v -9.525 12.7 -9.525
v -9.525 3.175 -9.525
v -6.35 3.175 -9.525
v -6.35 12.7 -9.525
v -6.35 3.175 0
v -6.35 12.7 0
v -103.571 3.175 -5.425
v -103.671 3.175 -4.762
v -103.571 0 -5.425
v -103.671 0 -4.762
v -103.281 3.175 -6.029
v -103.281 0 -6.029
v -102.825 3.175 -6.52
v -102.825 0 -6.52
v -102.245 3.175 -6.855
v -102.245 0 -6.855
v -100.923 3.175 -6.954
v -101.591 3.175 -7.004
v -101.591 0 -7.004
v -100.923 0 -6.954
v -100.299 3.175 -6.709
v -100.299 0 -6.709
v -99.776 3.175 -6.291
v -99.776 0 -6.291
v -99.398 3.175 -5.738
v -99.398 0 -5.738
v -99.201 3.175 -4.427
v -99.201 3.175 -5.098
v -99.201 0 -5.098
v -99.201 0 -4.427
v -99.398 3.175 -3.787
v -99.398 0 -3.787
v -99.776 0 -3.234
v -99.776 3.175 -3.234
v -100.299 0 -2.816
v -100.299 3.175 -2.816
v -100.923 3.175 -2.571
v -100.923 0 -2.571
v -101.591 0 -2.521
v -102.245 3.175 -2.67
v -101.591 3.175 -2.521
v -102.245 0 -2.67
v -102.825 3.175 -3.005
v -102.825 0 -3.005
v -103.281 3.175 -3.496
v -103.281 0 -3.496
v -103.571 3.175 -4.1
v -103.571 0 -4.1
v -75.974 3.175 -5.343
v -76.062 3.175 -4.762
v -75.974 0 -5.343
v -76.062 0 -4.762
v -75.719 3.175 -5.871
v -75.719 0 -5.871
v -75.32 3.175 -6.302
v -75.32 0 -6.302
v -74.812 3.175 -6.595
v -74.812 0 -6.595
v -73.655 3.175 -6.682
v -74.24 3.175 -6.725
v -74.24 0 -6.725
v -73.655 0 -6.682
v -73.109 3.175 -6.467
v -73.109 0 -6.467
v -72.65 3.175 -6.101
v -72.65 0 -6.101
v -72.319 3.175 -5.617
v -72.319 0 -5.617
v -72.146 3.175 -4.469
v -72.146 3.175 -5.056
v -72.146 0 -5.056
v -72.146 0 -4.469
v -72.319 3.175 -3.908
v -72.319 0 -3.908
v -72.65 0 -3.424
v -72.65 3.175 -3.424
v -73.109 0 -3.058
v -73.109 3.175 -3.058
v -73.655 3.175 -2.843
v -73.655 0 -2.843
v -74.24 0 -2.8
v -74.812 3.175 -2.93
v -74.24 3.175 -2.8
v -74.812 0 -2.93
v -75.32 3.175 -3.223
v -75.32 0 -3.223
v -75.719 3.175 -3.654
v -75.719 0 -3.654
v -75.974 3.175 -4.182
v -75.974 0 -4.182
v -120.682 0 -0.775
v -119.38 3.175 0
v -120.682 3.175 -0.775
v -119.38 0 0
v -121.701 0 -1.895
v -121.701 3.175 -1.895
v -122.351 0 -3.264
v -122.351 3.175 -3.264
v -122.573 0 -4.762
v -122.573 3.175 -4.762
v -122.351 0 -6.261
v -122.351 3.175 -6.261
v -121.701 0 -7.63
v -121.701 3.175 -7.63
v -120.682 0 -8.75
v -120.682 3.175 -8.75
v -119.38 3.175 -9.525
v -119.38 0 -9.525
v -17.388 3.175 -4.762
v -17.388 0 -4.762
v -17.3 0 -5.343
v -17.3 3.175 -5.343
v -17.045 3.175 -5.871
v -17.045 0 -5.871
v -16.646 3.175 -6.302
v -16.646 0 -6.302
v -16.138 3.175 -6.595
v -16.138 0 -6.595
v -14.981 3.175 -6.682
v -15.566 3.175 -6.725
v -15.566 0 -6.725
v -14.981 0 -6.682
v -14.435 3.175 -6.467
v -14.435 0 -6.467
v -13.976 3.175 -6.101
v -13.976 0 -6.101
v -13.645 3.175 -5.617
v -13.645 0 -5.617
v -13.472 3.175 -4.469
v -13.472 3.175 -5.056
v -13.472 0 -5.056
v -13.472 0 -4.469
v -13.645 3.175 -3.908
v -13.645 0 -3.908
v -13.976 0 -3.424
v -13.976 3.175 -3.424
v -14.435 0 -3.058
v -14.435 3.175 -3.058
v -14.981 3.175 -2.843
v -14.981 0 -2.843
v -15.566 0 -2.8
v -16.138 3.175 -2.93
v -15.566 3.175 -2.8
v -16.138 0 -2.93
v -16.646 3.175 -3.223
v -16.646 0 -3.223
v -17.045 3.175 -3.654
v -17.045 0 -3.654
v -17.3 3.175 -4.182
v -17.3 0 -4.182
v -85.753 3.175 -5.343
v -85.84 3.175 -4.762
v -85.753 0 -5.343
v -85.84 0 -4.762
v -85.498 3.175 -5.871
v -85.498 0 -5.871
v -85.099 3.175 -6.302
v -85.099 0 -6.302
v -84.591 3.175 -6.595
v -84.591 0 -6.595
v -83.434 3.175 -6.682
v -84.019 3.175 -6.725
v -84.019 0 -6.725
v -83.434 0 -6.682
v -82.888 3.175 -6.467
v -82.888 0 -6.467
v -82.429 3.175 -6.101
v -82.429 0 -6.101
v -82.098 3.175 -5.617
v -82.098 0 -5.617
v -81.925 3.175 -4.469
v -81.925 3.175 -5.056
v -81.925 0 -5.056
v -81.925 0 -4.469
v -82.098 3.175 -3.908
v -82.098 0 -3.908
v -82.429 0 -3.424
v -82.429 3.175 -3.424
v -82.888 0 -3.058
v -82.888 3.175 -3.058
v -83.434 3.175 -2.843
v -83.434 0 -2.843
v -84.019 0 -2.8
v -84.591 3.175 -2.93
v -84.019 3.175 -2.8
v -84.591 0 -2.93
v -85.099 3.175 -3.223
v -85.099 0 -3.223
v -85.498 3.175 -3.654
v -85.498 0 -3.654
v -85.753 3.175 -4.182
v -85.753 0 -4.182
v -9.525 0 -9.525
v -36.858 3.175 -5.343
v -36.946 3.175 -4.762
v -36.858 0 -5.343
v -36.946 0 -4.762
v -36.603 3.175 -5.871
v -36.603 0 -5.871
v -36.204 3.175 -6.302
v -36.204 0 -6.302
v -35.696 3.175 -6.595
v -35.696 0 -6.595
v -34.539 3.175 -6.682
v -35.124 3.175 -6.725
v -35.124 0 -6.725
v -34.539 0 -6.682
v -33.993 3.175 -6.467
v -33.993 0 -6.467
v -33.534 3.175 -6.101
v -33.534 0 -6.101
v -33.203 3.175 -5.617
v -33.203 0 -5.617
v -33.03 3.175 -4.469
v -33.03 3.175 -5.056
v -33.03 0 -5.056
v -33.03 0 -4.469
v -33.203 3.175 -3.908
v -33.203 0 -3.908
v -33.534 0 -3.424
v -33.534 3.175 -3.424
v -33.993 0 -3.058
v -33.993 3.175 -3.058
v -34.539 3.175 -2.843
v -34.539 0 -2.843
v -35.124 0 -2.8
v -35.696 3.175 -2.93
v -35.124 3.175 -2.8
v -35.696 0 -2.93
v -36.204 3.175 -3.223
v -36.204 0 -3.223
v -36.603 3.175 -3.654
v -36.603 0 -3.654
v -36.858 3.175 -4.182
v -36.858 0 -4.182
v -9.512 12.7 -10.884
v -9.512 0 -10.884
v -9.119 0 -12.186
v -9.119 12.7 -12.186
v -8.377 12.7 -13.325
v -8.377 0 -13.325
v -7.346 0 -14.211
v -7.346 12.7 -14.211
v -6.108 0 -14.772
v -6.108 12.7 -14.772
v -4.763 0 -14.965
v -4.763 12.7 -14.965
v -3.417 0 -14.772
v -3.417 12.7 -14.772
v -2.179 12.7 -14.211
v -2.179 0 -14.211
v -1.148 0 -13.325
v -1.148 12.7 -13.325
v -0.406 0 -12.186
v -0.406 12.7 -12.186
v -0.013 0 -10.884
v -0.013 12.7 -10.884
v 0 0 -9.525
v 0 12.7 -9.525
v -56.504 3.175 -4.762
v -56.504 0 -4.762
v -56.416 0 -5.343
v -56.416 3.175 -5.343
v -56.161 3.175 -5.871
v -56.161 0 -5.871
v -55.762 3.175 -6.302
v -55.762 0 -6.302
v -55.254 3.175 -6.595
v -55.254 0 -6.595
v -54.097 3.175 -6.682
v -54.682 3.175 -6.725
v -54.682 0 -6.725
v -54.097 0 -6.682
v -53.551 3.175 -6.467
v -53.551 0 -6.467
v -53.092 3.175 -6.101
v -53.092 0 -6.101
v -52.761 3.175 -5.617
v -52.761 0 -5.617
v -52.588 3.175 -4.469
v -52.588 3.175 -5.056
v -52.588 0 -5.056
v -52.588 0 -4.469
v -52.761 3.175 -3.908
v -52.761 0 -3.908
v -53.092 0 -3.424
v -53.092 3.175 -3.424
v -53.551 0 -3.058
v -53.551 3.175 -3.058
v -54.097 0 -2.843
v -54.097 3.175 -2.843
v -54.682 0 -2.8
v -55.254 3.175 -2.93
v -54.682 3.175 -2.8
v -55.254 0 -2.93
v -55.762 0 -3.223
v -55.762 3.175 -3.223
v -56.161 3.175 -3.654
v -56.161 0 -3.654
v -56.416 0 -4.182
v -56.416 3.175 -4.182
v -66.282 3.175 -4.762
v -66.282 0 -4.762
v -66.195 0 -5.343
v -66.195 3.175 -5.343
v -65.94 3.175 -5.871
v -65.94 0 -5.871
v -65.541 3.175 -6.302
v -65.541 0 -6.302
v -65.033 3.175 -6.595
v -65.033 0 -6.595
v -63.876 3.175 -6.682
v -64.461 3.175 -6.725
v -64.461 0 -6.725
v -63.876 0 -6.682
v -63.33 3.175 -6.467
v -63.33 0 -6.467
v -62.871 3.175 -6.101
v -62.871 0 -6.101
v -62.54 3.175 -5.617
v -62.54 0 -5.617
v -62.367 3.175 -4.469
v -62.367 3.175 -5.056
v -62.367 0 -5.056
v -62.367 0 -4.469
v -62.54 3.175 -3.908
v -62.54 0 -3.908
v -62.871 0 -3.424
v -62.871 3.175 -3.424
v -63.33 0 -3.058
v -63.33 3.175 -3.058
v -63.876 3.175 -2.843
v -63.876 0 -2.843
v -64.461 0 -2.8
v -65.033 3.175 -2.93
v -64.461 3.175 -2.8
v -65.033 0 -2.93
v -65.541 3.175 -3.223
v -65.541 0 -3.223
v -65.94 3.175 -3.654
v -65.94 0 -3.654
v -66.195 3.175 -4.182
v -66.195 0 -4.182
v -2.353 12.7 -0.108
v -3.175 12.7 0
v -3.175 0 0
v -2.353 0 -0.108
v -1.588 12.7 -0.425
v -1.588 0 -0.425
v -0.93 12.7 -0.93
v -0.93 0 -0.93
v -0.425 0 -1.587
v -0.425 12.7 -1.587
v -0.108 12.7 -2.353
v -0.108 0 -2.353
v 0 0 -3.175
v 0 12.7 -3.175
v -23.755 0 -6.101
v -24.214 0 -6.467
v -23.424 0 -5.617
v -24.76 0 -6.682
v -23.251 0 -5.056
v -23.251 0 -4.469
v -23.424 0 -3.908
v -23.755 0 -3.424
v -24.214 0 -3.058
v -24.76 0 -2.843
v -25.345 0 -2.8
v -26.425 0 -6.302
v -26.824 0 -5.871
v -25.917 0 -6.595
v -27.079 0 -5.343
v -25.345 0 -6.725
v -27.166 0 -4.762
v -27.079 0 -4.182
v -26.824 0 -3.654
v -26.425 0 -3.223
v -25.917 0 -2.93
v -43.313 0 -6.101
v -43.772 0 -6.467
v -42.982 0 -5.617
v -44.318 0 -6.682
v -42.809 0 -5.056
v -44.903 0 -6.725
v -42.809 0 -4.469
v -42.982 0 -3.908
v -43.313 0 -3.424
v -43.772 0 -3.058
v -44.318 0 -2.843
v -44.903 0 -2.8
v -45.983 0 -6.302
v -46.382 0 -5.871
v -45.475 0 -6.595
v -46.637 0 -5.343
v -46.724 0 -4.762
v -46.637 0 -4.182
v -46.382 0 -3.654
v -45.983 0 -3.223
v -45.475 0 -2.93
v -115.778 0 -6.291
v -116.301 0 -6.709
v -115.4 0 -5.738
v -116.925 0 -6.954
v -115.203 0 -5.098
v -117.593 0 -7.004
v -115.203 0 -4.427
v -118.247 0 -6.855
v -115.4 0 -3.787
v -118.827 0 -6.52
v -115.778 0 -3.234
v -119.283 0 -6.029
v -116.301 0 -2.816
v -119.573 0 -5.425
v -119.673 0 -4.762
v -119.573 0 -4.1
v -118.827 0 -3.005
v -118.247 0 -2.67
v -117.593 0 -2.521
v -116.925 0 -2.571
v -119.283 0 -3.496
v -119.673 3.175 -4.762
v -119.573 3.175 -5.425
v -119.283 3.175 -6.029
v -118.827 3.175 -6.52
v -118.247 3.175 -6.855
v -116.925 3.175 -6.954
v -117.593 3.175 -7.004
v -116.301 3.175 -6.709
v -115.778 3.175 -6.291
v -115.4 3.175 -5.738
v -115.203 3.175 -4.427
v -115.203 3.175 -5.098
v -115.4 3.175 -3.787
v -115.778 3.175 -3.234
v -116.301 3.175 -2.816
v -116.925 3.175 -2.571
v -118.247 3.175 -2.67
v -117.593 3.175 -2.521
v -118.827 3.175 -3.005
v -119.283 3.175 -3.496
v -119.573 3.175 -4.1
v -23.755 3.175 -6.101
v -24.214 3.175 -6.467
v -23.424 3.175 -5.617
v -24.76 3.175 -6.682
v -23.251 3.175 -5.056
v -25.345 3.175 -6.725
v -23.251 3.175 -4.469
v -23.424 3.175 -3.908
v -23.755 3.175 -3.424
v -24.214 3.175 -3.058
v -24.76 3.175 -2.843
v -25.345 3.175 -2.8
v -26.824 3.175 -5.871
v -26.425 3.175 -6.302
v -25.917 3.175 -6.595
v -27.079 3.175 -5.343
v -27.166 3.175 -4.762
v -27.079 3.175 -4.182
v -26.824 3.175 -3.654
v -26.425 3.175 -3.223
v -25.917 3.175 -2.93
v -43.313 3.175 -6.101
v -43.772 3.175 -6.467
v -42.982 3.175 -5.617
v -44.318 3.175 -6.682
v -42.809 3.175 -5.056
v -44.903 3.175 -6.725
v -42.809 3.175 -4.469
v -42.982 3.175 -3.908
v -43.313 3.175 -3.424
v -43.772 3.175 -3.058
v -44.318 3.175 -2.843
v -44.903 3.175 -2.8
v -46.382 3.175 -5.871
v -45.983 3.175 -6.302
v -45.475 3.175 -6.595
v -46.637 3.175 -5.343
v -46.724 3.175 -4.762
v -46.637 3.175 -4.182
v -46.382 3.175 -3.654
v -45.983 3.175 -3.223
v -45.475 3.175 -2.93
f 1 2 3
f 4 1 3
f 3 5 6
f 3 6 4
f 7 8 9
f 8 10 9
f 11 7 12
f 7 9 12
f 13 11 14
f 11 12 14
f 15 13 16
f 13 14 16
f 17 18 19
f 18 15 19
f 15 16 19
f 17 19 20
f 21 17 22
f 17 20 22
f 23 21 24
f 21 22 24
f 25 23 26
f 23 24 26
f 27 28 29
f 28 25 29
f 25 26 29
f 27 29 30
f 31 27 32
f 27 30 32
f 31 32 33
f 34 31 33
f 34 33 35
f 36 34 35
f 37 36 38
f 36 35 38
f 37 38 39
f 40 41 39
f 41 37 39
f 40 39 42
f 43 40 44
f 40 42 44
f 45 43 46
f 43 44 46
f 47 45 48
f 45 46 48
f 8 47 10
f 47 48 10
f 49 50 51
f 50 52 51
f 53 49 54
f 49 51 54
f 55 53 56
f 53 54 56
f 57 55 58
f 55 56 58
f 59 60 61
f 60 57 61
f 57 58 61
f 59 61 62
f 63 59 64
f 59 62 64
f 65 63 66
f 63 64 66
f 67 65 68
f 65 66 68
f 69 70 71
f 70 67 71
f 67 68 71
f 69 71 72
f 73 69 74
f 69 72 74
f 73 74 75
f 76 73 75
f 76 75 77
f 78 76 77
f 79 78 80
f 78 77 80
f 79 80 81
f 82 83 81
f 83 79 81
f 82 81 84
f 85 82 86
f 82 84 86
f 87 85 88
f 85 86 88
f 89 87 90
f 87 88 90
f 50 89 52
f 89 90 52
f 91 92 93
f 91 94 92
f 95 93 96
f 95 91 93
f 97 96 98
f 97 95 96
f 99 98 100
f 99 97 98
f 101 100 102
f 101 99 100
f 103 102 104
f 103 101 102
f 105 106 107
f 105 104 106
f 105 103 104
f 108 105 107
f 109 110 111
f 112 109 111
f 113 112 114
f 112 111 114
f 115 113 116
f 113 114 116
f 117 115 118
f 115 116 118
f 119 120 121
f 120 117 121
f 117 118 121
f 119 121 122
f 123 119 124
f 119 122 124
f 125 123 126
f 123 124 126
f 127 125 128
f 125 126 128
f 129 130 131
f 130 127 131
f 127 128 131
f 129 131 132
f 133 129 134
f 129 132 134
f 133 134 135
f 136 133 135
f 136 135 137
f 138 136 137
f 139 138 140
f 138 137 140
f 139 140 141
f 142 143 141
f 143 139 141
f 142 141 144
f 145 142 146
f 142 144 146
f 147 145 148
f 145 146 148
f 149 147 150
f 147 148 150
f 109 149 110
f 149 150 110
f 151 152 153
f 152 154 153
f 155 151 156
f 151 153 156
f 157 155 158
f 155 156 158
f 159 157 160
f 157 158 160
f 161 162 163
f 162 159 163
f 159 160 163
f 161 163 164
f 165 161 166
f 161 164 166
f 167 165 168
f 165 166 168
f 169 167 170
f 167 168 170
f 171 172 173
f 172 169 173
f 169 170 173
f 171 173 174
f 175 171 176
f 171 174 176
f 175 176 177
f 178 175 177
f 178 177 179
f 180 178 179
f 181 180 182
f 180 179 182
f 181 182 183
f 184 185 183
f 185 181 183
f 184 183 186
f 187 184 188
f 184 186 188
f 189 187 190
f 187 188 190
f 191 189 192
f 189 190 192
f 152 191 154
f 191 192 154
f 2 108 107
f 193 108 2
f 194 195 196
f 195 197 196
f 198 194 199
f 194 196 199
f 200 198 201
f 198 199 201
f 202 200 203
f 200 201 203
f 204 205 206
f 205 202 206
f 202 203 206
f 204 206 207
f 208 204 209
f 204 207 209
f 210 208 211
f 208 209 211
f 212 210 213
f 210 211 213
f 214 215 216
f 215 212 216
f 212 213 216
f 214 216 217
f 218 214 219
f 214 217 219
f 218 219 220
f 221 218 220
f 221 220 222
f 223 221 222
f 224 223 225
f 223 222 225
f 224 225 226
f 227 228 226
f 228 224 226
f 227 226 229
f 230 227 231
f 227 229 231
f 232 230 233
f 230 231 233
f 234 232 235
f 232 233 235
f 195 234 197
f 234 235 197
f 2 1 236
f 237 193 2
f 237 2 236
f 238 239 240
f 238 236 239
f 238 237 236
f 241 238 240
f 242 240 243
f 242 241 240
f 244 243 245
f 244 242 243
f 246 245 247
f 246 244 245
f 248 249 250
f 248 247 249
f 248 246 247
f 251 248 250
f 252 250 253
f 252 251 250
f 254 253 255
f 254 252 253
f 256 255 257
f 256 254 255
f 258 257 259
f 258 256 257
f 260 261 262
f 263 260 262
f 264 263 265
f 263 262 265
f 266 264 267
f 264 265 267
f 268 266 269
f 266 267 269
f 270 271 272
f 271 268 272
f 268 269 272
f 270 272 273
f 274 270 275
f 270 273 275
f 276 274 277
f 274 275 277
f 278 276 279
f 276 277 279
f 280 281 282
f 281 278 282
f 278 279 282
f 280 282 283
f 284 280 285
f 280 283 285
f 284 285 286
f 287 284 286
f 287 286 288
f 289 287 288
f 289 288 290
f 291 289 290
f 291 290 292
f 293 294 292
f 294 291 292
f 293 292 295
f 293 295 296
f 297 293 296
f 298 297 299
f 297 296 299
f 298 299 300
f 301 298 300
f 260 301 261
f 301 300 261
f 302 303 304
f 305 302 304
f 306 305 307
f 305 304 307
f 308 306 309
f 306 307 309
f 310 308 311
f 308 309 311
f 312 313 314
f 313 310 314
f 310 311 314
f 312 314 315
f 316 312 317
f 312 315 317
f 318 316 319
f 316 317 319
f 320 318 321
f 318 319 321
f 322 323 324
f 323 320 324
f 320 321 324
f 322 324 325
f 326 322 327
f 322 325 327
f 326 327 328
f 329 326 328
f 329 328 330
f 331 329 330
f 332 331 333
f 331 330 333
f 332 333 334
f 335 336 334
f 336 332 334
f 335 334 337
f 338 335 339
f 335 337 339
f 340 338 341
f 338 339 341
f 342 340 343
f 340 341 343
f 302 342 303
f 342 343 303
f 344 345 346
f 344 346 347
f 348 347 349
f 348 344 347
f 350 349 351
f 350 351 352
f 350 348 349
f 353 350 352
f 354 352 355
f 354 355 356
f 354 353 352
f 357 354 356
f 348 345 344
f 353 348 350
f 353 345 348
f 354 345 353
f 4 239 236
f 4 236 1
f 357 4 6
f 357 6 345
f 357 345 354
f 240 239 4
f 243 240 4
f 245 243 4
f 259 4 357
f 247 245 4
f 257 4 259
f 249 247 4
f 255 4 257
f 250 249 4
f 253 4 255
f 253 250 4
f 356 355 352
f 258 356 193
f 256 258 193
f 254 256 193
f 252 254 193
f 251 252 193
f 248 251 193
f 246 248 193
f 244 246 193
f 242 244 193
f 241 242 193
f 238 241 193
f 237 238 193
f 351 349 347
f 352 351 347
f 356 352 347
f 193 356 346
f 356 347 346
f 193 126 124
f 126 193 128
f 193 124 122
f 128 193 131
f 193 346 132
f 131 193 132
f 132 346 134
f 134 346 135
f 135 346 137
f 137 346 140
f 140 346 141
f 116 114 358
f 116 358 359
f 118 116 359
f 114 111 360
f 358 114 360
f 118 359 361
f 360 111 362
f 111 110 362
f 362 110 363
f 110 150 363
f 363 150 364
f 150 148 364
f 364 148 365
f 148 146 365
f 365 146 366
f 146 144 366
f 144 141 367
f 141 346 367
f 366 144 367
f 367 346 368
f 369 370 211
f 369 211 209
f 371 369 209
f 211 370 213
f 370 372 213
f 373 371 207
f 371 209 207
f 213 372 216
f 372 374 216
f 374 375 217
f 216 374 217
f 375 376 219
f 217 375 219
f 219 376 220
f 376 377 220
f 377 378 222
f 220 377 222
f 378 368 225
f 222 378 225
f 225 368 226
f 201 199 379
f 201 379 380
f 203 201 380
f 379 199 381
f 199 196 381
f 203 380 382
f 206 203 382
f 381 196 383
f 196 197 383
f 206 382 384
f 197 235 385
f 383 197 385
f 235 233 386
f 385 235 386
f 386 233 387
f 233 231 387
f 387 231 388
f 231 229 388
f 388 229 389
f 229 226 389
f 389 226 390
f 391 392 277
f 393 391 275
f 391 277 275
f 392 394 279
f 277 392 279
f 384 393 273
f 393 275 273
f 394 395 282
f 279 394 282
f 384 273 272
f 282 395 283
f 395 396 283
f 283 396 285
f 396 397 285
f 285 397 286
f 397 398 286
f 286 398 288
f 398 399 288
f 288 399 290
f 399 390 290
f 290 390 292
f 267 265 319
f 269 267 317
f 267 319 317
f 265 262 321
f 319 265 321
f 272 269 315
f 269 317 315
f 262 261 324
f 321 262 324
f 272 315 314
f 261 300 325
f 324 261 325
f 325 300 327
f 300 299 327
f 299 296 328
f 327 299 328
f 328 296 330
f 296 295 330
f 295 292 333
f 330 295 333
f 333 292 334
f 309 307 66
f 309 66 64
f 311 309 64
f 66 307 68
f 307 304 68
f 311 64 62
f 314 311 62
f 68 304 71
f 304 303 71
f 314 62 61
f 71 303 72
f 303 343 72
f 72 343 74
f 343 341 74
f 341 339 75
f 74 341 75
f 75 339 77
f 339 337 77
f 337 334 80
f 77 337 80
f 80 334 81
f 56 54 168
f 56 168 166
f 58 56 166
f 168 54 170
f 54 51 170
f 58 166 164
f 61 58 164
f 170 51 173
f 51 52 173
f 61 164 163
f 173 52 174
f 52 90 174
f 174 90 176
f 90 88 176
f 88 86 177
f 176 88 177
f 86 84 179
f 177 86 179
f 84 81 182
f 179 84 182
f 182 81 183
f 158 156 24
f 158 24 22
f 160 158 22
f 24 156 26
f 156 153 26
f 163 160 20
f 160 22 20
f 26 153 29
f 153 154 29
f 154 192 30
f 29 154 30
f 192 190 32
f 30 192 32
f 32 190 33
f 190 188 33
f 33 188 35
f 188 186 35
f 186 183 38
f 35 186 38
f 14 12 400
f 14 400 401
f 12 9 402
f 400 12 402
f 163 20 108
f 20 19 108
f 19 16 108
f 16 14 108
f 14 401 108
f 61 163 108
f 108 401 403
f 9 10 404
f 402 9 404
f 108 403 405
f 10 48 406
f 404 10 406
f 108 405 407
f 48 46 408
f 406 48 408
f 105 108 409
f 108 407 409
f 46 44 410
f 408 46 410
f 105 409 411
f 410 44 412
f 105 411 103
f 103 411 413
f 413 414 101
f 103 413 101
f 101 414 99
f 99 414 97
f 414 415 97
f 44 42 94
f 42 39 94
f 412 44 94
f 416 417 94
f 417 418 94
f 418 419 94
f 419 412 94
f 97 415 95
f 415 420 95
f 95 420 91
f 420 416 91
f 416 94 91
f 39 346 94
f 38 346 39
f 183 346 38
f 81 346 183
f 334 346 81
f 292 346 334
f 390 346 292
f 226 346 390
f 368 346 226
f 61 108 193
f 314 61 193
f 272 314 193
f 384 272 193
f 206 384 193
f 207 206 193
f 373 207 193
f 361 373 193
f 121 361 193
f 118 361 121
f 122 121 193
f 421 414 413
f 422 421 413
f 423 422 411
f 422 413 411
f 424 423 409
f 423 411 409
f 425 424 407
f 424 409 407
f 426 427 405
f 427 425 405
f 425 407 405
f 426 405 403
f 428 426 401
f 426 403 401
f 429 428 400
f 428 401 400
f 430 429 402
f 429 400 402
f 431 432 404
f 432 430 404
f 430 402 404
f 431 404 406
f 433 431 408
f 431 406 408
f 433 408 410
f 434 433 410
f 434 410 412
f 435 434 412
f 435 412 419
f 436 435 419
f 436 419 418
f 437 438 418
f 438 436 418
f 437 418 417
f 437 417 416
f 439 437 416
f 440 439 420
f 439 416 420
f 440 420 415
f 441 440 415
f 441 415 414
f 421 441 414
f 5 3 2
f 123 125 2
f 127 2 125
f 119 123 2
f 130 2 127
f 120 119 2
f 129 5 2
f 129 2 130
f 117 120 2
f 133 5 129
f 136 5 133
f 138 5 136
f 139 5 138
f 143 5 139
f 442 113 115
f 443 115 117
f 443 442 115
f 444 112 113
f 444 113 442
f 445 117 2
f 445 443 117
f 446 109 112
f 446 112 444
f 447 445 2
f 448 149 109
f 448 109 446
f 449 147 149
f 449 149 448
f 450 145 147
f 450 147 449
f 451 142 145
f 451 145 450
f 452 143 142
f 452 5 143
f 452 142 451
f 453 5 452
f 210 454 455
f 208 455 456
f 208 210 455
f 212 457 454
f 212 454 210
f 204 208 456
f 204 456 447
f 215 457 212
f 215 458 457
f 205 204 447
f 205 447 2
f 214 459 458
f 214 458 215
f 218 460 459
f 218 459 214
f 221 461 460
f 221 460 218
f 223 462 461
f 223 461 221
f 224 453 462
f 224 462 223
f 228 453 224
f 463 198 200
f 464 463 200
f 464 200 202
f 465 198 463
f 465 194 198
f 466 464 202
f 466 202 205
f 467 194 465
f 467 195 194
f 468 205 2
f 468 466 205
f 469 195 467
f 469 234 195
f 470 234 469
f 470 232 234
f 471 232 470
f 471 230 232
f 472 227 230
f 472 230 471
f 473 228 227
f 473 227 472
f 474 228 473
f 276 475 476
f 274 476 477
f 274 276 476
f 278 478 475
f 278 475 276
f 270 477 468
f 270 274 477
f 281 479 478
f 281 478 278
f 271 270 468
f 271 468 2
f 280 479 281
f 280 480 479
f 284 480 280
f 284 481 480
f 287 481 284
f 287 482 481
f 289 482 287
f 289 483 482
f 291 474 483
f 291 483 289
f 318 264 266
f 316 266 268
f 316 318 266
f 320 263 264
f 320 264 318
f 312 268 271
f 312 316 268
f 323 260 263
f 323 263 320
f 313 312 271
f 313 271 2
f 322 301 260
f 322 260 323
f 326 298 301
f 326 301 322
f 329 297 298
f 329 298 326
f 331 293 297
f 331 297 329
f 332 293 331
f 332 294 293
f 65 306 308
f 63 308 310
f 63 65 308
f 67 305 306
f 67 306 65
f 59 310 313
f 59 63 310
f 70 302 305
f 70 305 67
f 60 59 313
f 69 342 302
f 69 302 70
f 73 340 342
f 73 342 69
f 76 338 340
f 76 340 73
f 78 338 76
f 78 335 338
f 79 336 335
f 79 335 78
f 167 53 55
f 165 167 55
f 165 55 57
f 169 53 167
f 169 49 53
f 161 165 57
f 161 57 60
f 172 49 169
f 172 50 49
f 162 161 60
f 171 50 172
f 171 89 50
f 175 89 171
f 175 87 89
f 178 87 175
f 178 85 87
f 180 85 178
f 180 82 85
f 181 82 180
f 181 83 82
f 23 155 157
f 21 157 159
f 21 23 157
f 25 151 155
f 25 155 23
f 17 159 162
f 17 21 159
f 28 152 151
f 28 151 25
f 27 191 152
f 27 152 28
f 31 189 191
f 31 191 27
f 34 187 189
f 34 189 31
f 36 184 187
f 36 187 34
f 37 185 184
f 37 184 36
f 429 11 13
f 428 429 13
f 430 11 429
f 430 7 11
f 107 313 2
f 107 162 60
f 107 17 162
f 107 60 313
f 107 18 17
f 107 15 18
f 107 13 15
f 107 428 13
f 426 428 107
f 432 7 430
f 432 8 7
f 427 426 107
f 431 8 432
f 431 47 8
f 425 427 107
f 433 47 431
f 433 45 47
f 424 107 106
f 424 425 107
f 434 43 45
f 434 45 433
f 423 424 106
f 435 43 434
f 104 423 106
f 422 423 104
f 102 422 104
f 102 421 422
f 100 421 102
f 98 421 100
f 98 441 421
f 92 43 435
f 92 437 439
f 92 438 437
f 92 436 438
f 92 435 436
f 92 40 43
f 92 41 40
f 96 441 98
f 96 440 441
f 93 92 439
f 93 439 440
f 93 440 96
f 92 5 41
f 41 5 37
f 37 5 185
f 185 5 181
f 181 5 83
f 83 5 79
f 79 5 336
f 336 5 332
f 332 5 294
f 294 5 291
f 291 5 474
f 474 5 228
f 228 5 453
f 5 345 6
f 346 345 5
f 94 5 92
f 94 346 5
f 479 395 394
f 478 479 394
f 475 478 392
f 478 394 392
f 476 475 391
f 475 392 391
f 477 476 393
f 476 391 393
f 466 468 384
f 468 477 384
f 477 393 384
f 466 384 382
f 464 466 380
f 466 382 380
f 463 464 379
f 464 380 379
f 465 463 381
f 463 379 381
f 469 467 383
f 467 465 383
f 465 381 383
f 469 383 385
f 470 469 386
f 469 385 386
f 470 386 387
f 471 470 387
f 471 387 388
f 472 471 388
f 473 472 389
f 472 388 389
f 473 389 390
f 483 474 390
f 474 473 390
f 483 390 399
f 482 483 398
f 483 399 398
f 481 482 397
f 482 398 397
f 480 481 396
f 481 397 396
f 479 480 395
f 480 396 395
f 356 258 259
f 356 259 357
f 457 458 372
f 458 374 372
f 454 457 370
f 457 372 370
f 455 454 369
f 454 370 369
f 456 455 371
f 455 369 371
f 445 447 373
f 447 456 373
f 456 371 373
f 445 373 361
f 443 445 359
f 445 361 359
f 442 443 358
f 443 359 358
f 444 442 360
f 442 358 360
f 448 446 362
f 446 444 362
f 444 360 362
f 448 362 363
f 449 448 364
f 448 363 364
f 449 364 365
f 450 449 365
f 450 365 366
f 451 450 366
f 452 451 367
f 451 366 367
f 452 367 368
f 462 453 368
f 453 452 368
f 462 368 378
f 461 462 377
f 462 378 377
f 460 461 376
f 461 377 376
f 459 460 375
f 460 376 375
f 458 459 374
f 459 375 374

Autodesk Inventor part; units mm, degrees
ref_plane "YZ Plane" through (0, 0, 0) normal (1, 0, 0) x (0, 1, 0)
ref_plane "XZ Plane" through (0, 0, 0) normal (0, 1, 0) x (-1, 0, 0)
ref_plane "XY Plane" through (0, 0, 0) normal (0, 0, 1) x (1, 0, 0)
sketch "Sketch1" plane through (0, 0, 0) normal (0, 1, 0) x (-1, 0, 0)
  line L0 (0, 0) -> (119.38, 0)
  line L1 (119.38, -9.525) -> (9.525, -9.525)
  line L2 (0, -9.525) -> (0, 0)
  arc A0 (0, -9.525) -> (9.525, -9.525) centre (4.7625, -10.16) ccw
  arc A1 (119.38, -9.525) -> (119.38, 0) centre (117.4254, -4.7625) ccw
  circle A2 centre (117.4254, -4.7625) radius 2.2479
  circle A3 centre (101.4234, -4.7625) radius 2.2479
  circle A4 centre (83.872, -4.7625) radius 1.9685
  circle A5 centre (74.093, -4.7625) radius 1.9685
  circle A6 centre (64.314, -4.7625) radius 1.9685
  circle A7 centre (54.535, -4.7625) radius 1.9685
  circle A8 centre (44.756, -4.7625) radius 1.9685
  circle A9 centre (34.977, -4.7625) radius 1.9685
  circle A10 centre (25.198, -4.7625) radius 1.9685
  circle A11 centre (15.419, -4.7625) radius 1.9685
  dimension "d9" = 9.525
  dimension "d10" = 119.38
  dimension "d11" = 4.4958
  dimension "d12" = 4.4958
  dimension "d13" = 16.002
  dimension "d14" = 3.937
  dimension "d15" = 17.5514
  dimension "d18" = 9.779
extrude "Extrusion1" add sketch "Sketch1" along normal blind 3.175
sketch "Sketch2" plane through (0, 3.175, 0) normal (0, 1, 0) x (1, 0, 0)
  circle A0 centre (-34.977, 4.7625) radius 1.9685 construction
  arc A1 (0, 9.525) -> (-9.525, 9.525) centre (-4.7625, 10.16) ccw construction
  line L0 (0, 0) -> (-6.35, 0)
  line L1 (-6.35, 0) -> (-6.35, 9.525)
  line L2 (-9.525, 9.525) -> (-6.35, 9.525)
  line L3 (0, 9.525) -> (0, 0)
  line L4 (-119.38, 0) -> (0, 0) projected
  line L5 (0, 0) -> (0, 9.525) projected
  arc A2 (0, 9.525) -> (-9.525, 9.525) centre (-4.7625, 10.16) ccw
  point P0 (-4.7625, 4.7625)
  dimension "d27" = 0
  dimension "d28" = 6.35
  dimension "d32" = 0
extrude "Extrusion2" add sketch "Sketch2" along normal blind 9.525
fillet "Fillet2" radius 3.175 1 edges at (0, 6.35, 0)
properties part number "Rear Collector Arm"
